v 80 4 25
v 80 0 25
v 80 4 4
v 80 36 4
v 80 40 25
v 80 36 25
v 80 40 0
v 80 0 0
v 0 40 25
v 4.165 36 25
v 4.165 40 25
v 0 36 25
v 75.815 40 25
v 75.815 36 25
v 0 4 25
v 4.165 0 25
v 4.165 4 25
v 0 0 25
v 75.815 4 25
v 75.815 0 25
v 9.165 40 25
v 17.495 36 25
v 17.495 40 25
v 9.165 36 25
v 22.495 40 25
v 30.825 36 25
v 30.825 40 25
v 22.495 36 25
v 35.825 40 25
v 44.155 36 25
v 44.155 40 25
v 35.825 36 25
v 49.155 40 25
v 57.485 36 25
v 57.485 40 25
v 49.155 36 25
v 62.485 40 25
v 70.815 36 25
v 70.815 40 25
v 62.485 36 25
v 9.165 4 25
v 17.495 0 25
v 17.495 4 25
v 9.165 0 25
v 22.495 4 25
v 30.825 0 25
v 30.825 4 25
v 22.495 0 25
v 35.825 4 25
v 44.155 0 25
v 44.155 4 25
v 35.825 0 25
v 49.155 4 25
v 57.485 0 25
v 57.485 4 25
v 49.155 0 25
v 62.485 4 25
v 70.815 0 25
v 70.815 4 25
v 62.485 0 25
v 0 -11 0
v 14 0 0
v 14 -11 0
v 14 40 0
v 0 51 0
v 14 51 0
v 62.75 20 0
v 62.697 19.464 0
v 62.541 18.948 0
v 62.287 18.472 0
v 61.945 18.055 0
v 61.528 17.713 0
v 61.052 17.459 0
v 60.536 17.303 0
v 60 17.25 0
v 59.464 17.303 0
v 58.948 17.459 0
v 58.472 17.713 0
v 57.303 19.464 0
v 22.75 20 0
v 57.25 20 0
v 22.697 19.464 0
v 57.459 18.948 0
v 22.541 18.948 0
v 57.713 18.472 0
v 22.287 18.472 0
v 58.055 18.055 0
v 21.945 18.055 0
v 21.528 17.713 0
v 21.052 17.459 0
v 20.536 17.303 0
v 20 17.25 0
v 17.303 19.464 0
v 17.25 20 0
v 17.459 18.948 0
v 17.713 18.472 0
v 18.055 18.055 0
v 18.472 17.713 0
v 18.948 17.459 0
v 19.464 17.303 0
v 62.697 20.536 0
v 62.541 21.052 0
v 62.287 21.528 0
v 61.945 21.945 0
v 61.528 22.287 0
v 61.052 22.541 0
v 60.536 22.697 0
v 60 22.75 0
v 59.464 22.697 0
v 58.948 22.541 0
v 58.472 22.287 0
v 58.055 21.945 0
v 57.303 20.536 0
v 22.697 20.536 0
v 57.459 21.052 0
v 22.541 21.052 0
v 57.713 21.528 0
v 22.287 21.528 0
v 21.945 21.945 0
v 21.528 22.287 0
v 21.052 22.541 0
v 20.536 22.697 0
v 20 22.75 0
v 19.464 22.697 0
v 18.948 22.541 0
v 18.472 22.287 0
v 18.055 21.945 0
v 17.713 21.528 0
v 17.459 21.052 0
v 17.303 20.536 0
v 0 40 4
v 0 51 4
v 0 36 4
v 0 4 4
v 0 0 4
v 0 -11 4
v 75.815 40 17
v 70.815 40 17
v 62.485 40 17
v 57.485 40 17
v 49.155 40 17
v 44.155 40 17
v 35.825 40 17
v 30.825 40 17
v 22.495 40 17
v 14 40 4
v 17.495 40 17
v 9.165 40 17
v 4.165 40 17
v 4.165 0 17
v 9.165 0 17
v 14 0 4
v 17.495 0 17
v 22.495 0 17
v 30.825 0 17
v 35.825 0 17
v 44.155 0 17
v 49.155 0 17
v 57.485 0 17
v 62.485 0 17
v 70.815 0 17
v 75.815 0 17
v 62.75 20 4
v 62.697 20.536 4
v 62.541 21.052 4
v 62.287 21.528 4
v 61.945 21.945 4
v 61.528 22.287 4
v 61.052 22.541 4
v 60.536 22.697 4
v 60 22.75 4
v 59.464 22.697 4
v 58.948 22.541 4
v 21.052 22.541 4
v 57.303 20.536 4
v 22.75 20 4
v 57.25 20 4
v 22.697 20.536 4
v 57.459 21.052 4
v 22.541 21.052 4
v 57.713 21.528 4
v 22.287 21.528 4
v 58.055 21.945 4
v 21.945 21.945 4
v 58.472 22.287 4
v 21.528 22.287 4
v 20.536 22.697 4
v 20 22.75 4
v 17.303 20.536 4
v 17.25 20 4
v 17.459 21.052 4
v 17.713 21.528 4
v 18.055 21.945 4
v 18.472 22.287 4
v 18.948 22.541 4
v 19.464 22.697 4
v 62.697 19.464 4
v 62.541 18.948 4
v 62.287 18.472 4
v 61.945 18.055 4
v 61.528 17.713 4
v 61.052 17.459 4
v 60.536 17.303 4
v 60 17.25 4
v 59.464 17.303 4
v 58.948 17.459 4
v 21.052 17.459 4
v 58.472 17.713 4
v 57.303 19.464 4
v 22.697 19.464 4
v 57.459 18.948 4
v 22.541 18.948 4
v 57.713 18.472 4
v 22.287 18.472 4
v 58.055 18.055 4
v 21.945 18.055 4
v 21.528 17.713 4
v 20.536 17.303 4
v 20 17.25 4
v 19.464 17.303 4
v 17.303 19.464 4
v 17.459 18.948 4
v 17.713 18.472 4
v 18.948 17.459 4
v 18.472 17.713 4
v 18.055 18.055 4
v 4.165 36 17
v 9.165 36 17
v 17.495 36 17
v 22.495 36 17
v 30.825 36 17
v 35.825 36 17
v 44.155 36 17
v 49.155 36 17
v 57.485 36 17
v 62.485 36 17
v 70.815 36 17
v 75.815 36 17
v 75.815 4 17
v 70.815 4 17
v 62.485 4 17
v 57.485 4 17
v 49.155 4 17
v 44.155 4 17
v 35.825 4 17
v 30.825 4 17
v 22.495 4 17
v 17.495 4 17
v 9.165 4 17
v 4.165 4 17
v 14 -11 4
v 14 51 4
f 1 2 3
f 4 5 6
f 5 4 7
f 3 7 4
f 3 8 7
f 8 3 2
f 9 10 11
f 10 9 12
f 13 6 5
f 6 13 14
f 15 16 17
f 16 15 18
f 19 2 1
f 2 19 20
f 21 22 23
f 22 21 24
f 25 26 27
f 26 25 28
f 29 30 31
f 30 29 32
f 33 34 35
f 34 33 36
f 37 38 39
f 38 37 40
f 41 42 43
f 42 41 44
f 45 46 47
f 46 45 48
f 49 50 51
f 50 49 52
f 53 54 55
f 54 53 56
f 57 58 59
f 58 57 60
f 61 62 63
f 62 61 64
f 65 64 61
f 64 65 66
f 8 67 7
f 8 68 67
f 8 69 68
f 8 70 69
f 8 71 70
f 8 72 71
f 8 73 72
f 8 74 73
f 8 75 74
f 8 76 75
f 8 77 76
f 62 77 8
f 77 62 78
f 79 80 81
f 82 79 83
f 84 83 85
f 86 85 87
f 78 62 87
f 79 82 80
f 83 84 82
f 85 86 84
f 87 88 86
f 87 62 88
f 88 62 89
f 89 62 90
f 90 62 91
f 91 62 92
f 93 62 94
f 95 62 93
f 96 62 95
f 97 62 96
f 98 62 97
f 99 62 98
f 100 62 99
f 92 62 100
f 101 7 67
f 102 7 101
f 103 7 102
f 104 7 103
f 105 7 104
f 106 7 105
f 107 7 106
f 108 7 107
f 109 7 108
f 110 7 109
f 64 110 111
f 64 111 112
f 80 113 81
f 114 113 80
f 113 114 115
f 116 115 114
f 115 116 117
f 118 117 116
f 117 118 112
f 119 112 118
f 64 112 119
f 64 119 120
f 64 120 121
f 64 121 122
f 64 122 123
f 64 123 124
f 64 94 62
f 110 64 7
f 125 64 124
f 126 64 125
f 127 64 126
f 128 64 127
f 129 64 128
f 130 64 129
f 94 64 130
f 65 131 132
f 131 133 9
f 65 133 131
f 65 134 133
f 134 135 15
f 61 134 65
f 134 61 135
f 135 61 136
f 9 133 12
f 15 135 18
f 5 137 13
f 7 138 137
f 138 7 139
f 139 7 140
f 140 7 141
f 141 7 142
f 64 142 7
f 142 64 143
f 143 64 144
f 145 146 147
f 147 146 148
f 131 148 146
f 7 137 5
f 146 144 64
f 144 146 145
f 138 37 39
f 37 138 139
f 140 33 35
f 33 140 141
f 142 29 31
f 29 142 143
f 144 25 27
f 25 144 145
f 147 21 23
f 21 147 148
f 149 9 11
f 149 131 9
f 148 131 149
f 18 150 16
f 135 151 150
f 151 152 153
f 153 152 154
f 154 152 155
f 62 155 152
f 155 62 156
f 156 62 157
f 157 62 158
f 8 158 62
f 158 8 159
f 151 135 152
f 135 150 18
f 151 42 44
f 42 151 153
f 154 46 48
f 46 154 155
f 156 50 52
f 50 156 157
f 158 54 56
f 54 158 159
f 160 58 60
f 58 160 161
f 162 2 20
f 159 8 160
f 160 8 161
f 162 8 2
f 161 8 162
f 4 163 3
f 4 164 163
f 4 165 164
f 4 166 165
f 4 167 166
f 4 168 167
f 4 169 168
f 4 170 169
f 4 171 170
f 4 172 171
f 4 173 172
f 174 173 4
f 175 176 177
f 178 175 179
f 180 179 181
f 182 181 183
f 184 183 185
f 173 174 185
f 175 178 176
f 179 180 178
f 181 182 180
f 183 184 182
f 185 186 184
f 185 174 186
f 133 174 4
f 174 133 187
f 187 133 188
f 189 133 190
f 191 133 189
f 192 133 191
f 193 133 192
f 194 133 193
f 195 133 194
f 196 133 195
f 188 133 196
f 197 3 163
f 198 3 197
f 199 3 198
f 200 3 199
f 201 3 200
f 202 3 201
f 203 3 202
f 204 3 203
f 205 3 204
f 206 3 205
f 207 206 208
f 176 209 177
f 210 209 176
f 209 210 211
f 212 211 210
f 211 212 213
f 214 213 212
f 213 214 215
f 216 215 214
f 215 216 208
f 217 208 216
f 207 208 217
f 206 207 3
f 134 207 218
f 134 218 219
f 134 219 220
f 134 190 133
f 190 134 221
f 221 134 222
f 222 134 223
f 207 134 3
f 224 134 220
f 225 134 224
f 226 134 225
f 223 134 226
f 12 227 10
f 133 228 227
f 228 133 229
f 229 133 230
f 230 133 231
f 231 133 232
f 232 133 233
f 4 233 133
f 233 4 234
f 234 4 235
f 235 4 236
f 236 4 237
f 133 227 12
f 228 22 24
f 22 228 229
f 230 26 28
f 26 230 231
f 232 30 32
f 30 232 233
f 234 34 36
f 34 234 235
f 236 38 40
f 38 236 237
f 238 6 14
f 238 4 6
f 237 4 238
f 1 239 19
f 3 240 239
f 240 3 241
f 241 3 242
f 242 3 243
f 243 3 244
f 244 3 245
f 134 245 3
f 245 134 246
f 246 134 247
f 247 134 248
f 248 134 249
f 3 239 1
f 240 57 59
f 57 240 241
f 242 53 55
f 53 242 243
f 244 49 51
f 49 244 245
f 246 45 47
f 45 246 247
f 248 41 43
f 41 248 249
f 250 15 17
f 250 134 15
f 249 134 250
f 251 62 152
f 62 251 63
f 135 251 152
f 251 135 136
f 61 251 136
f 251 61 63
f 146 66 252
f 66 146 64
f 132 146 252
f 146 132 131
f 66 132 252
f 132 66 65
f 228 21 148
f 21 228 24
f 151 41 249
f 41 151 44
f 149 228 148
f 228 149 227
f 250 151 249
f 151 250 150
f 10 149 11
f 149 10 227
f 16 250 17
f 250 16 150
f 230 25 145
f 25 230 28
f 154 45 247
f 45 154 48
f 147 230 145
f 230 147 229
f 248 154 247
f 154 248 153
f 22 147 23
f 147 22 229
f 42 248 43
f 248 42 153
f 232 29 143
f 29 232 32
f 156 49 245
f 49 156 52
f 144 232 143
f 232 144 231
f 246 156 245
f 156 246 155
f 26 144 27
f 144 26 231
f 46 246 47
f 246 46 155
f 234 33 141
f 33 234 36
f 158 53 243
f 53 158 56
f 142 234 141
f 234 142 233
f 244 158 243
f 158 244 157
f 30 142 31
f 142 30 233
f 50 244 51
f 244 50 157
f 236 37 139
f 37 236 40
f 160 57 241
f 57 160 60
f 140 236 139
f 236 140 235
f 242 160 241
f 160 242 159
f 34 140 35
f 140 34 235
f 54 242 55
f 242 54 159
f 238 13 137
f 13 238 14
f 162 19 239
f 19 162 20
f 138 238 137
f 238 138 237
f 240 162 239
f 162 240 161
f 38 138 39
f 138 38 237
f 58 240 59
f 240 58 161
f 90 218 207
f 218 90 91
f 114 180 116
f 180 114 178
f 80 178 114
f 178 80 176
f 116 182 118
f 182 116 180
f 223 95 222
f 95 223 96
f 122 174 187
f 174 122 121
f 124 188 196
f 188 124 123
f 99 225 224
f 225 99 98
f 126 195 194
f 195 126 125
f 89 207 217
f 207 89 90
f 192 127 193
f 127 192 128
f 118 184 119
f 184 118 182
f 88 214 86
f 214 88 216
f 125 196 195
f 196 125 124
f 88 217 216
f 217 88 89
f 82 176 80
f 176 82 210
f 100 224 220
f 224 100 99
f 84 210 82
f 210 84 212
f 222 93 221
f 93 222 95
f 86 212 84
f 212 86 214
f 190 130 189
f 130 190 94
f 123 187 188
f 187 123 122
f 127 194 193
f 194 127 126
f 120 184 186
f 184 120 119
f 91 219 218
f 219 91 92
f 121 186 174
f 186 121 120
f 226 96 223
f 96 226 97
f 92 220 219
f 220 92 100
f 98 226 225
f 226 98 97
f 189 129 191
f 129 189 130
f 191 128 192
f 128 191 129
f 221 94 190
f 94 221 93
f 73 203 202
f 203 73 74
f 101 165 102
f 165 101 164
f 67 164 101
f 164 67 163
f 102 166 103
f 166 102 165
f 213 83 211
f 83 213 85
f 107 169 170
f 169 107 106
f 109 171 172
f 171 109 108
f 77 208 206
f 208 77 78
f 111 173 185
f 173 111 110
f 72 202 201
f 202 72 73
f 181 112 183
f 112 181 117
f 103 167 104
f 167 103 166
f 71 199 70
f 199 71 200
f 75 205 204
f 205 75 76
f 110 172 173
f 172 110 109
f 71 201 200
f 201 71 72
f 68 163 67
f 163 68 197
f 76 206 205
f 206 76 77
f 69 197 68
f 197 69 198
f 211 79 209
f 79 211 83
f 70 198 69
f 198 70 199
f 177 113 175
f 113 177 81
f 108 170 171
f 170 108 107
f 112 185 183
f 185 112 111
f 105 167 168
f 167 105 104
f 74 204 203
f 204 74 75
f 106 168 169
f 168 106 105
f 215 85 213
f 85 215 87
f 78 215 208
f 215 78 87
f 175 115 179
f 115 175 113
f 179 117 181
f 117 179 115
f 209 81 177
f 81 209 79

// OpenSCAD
$fn = 32;

// ----------------------------------------------------------------------
// Cable duct: 80 x 40 x 25 mm, 6 fingers
// ----------------------------------------------------------------------

// --- parameters (mm) ---
channel_l = 80;           // duct length, X
channel_w = 40;           // duct width, Y
channel_h = 25;           // duct height, Z
channel_t = 4;            // side wall thickness
floor_t = 4;              // floor thickness
slot_w = 5;               // finger slot width
slot_h = 13;              // finger slot height
fingers = 6;              // number of finger slots per side
pitch = 13.33;            // finger pitch
hole_d = 5.5;             // floor mounting hole
hole_n = 2;               // mounting holes in the floor
ear_w = 12;               // mounting ear width
ear_l = 14;               // mounting ear length

module shell() {
  difference() {
    cube([channel_l, channel_w, channel_h]);
    /* open top channel */
    translate([-channel_t - 1, channel_t, floor_t])
      cube([channel_l + 2 * channel_t + 2, channel_w - 2 * channel_t, channel_h + 1]);
  }
}

module ears() {
  translate([0, -ear_w + 1, 0]) cube([ear_l, ear_w, floor_t]);
  translate([0, channel_w - 1, 0]) cube([ear_l, ear_w, floor_t]);
}

difference() {
  union() {
    shell();
    ears();
  }
  /* finger slots cut through both side walls */
  for (i = [0 : fingers - 1]) translate([pitch / 2 + i * pitch - slot_w / 2, -1, floor_t + slot_h]) cube([slot_w, channel_w + 2, channel_h]);
  for (i = [0 : hole_n - 1]) translate([(channel_l / hole_n) * (i + 0.5), channel_w / 2, -1]) cylinder(h = floor_t + 2, d = hole_d);
}
